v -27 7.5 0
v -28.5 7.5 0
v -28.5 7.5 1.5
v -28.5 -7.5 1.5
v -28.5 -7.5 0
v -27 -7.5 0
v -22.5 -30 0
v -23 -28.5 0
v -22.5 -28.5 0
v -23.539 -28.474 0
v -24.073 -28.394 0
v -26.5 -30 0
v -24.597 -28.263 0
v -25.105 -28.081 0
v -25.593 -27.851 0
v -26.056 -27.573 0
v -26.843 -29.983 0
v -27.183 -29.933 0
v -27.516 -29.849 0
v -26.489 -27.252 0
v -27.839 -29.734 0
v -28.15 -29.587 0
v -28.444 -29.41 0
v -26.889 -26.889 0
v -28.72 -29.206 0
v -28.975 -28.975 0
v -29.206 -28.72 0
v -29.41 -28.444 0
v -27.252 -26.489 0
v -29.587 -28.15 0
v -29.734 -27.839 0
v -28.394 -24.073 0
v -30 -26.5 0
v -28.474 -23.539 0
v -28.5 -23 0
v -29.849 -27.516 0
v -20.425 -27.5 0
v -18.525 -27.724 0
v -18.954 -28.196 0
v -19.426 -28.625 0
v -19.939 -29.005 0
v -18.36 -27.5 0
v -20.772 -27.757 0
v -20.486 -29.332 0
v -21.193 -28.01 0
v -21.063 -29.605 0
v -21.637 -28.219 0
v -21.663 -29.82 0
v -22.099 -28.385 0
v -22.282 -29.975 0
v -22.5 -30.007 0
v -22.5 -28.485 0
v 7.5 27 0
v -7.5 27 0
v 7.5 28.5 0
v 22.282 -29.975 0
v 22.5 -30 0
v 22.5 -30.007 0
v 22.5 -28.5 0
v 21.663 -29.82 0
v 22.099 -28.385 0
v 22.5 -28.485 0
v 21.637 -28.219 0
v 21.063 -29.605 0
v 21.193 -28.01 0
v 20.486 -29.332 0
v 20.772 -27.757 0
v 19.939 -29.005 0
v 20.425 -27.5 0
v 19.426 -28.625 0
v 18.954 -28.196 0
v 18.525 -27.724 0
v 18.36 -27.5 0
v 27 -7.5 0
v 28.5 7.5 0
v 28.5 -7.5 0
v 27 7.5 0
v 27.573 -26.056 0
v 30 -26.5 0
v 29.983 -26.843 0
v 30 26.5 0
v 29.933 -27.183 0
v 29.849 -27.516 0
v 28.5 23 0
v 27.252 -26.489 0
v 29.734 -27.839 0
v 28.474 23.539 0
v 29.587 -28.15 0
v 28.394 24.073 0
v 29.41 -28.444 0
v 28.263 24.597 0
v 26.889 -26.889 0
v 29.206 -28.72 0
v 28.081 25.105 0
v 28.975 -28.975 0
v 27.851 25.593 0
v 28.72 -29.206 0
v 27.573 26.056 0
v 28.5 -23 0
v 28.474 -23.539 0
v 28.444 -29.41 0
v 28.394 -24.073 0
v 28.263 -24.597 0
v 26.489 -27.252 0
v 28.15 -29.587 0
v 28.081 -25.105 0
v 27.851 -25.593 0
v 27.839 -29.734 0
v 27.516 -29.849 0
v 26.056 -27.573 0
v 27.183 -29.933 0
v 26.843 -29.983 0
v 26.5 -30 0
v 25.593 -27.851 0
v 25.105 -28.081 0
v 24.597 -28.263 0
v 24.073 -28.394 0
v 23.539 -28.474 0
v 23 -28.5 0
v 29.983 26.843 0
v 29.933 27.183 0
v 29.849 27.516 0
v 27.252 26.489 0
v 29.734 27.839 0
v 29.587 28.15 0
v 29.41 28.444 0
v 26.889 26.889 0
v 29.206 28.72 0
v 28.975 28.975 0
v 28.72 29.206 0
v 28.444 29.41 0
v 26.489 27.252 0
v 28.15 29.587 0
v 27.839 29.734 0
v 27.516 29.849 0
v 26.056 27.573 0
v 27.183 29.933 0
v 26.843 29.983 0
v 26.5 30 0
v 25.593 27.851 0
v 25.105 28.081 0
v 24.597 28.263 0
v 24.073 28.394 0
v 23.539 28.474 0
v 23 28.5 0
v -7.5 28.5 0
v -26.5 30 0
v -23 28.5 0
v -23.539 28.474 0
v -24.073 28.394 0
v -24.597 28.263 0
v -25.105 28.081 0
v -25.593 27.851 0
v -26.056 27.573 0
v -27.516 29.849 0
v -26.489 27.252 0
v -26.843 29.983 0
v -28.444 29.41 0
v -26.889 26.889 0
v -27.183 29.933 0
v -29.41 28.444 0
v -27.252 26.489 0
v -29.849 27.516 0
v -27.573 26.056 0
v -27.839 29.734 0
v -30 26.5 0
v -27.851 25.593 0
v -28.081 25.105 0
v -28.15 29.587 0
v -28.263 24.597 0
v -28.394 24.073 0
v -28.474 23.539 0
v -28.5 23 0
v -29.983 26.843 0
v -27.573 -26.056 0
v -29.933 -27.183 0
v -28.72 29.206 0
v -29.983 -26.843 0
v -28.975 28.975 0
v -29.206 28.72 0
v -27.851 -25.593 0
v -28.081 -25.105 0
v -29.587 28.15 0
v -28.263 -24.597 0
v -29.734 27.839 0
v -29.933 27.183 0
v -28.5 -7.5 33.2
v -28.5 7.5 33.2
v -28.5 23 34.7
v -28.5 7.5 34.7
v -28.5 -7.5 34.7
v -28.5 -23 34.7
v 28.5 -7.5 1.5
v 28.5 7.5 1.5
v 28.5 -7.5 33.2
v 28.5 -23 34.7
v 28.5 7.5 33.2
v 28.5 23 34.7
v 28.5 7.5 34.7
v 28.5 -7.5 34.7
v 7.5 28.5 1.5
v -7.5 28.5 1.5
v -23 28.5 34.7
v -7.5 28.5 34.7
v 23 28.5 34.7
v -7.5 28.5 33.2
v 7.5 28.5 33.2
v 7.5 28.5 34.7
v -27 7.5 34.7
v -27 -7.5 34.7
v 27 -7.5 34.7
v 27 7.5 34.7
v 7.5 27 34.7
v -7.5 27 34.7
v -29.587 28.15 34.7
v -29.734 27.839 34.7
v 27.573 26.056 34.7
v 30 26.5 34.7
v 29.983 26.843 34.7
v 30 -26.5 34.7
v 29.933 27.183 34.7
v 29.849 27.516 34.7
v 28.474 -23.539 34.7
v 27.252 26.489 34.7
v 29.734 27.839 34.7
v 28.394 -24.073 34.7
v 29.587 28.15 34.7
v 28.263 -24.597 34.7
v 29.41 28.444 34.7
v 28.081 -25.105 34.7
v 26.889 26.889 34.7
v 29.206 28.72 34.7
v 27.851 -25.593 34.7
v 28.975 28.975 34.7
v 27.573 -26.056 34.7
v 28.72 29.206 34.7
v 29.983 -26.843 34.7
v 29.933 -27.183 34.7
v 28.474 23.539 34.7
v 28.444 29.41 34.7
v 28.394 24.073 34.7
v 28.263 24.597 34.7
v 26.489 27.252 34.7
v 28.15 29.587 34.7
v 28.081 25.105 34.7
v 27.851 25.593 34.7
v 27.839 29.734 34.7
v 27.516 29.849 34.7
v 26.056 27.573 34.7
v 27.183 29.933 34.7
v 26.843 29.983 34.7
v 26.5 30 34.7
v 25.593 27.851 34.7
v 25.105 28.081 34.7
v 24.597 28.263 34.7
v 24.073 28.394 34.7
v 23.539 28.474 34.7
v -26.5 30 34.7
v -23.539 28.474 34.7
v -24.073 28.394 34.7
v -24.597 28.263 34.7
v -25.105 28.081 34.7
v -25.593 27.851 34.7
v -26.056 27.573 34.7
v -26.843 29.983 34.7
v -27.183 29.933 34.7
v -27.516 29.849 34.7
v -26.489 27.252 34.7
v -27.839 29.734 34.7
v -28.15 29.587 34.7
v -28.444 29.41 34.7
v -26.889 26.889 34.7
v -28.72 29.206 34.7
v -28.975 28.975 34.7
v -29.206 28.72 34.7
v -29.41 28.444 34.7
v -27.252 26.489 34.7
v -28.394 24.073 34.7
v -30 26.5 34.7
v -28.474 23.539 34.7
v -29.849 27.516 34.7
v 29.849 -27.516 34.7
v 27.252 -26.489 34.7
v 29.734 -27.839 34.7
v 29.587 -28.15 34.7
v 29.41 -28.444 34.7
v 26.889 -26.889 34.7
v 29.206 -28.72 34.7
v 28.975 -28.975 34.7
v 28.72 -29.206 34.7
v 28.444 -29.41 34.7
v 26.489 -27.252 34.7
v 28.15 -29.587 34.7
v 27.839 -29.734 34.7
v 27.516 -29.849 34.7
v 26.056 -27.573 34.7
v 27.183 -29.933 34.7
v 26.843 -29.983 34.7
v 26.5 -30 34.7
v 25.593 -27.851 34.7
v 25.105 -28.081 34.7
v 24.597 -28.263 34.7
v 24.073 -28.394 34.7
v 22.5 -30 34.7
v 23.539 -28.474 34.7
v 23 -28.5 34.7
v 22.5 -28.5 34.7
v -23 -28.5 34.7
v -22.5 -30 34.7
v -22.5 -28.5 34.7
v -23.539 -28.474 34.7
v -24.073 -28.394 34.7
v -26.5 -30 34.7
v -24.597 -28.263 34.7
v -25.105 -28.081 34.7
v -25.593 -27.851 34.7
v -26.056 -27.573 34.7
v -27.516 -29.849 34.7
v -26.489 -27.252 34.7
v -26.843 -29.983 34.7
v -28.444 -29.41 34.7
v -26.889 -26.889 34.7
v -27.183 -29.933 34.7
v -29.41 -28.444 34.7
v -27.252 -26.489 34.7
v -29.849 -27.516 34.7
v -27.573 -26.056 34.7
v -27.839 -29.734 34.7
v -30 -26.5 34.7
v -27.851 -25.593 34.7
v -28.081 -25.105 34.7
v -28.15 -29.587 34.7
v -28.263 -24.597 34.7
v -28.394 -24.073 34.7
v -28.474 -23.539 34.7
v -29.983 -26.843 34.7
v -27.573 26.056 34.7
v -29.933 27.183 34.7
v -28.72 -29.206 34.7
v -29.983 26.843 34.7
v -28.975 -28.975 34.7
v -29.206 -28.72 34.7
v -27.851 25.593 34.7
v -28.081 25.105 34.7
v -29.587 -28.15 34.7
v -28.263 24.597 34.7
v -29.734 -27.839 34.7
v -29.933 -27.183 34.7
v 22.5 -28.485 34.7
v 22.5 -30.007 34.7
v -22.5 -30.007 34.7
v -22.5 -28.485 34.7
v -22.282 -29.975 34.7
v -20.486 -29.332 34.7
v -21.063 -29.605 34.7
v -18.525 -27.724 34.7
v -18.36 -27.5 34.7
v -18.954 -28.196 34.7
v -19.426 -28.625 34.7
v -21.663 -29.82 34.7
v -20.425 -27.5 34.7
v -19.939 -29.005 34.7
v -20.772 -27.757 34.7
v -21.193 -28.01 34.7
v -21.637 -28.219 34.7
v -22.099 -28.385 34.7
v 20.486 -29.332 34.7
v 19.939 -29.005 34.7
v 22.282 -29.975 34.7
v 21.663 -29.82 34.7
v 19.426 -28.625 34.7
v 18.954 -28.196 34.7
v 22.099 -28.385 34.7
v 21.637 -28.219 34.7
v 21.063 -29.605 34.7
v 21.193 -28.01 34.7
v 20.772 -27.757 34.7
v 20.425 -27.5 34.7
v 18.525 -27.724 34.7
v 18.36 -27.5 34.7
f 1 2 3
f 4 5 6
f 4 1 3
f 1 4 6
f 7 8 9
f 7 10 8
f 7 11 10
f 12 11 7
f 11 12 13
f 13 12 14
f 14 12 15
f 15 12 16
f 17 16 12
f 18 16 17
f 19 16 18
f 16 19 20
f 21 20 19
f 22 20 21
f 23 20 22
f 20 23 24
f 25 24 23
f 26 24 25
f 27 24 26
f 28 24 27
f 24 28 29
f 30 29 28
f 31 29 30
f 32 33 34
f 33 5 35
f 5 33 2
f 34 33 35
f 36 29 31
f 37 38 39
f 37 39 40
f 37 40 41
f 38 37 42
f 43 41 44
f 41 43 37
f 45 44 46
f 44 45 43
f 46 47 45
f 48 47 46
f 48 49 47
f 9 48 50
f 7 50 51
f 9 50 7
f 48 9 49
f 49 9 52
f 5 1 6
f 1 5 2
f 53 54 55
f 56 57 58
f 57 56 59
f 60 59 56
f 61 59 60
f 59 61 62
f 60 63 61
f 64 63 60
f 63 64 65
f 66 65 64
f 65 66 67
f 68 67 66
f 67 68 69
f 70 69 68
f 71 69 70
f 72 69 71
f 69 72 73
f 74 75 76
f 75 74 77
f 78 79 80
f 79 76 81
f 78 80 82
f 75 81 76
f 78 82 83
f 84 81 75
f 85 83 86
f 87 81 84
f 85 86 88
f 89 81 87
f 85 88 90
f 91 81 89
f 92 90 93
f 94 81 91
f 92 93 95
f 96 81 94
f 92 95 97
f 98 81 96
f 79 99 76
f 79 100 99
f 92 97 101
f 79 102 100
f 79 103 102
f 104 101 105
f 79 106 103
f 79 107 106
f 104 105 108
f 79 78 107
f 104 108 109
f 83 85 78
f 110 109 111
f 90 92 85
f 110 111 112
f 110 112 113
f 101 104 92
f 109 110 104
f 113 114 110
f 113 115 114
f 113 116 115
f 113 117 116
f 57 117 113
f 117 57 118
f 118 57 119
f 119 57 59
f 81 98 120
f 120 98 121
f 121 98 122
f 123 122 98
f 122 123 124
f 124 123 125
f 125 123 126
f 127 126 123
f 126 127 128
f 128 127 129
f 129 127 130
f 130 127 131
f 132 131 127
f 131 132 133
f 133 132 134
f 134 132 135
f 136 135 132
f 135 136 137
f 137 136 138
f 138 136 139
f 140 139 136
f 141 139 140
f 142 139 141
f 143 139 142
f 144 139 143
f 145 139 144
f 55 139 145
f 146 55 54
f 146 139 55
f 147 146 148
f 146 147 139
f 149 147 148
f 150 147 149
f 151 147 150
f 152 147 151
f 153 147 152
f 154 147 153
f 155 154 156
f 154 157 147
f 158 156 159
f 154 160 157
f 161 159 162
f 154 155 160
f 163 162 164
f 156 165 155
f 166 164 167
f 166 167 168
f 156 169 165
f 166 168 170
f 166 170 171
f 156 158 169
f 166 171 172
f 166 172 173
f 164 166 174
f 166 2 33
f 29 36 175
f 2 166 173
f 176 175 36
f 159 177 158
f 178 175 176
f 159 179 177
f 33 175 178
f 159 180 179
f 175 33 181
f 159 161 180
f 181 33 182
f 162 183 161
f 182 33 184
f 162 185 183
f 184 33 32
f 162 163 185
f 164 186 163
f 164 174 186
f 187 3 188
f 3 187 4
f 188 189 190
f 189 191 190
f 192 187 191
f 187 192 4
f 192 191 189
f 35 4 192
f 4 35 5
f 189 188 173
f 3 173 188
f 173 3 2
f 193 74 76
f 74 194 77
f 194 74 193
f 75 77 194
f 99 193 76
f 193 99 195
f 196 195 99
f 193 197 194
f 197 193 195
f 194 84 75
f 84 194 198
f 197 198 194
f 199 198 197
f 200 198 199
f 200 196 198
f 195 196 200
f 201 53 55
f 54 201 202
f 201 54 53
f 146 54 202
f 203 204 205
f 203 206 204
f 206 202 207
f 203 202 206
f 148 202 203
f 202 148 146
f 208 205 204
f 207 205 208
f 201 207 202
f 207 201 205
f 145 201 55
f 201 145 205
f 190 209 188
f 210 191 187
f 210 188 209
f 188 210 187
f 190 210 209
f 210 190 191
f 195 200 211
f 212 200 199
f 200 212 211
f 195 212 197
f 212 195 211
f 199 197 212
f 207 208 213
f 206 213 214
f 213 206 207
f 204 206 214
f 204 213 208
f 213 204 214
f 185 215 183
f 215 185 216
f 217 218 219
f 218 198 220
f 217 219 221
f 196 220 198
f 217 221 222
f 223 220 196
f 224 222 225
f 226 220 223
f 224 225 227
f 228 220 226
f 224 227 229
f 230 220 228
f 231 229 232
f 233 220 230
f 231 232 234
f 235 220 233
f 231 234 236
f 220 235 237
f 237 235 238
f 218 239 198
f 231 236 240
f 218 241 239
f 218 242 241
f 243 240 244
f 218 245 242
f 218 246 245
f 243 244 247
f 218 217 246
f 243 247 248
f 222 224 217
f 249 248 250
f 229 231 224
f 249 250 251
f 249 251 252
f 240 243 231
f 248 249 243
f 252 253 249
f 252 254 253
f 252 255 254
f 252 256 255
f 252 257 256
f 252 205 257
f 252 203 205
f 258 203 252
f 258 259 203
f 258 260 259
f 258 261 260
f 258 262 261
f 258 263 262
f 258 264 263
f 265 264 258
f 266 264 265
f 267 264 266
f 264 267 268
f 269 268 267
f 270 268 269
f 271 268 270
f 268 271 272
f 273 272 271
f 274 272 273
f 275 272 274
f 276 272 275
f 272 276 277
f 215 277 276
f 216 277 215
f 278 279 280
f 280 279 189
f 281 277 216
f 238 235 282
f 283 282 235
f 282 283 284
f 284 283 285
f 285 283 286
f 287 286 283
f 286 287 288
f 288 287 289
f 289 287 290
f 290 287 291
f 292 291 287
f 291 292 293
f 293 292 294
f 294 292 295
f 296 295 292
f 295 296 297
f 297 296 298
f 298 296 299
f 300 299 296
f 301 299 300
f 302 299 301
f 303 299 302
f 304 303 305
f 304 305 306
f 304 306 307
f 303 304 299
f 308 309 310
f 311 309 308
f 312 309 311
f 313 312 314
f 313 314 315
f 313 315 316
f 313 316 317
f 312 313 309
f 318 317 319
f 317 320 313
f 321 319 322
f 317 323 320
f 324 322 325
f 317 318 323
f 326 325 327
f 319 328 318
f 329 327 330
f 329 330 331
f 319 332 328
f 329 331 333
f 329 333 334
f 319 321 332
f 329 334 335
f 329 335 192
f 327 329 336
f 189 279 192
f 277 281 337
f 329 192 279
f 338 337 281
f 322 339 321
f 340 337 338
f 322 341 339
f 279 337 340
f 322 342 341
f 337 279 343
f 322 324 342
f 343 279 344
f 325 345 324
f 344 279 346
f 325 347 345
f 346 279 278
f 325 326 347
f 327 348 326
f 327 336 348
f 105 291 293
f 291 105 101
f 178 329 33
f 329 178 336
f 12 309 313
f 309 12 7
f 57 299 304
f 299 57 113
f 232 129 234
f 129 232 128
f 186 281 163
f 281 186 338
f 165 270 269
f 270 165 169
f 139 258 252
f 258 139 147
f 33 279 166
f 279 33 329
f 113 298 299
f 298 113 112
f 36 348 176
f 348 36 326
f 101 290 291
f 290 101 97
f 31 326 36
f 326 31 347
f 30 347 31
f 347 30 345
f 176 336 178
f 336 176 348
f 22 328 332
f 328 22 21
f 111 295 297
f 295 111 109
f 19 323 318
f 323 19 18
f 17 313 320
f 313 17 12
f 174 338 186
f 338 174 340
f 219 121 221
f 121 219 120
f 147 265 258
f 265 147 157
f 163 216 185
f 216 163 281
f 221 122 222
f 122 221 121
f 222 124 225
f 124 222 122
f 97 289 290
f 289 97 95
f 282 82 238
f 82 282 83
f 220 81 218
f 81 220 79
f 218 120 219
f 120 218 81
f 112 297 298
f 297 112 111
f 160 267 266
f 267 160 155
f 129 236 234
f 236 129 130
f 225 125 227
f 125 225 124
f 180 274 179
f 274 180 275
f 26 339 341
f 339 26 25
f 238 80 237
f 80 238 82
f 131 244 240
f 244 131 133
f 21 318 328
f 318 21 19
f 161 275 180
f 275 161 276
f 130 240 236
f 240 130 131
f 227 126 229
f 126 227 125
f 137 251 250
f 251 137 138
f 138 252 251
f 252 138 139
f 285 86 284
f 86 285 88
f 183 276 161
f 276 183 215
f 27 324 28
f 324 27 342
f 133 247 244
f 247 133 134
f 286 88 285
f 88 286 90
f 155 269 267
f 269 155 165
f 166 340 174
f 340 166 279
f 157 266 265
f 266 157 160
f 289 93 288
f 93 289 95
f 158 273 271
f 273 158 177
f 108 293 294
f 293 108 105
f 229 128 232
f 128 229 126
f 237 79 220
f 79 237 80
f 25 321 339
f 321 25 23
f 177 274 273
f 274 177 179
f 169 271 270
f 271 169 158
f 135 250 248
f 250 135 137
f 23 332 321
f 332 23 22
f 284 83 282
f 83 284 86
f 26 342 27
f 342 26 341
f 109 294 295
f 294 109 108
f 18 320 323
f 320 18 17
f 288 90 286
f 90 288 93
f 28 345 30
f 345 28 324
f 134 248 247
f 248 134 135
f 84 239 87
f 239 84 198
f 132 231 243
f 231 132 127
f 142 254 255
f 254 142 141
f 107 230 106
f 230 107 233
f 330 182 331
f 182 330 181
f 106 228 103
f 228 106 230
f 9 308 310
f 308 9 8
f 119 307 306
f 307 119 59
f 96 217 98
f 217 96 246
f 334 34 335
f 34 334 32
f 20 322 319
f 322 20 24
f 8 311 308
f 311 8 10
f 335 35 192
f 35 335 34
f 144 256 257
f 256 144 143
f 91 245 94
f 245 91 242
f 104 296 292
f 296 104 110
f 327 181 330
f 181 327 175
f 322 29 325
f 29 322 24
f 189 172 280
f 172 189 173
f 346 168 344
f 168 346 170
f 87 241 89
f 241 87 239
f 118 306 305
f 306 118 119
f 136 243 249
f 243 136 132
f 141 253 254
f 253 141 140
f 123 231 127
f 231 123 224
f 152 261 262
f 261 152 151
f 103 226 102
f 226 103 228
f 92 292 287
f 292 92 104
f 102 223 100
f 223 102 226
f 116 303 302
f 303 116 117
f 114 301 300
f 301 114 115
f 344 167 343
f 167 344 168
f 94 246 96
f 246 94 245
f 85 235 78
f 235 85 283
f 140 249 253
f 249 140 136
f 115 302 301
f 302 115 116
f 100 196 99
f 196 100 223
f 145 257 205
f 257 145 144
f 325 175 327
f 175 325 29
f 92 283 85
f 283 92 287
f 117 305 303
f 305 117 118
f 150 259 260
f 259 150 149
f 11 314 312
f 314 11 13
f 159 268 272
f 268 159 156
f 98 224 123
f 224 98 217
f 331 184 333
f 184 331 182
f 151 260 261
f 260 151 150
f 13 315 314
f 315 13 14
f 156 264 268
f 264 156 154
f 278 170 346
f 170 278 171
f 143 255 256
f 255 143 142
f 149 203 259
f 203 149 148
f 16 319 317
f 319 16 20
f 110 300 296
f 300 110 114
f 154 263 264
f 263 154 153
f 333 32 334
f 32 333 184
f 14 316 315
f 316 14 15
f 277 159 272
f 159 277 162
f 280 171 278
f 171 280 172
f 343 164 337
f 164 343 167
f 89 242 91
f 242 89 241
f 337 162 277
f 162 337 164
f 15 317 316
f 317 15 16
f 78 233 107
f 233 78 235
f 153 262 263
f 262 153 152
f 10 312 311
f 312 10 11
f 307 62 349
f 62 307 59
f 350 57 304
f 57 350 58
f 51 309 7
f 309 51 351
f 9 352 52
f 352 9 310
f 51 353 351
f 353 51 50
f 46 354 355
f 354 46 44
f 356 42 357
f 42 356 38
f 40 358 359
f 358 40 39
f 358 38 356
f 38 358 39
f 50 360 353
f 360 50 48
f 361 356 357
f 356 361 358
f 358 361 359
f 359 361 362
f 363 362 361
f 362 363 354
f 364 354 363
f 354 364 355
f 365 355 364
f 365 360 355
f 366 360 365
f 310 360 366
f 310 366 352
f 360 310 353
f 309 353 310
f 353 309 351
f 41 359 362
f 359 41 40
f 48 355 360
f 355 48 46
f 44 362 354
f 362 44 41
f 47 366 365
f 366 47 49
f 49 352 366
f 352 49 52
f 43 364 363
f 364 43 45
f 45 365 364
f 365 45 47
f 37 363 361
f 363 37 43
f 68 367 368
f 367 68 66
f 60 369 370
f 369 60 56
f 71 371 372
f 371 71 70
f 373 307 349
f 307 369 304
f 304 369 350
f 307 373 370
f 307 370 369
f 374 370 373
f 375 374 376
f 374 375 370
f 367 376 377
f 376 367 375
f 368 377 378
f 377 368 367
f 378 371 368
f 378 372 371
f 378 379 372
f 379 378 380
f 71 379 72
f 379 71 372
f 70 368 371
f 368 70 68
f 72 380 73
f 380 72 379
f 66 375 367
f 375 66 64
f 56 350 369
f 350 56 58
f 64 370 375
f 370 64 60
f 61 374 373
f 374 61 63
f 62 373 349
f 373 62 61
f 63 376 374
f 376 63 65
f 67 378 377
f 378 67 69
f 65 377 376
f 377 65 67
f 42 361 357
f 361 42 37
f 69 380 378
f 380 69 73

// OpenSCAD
W=57;
H=35-0.3;

for(j=[0,1])
    translate([0,0,j*(H)])
mirror([0,0,j])
for(i=[0,2,3])
    rotate([0,0,i*90])
translate([-W/2,0,0])
rotate([90,0,0])
linear_extrude(height=15,center=true)
polygon([[0,0],[1.5,0],[0,1.5]]);

difference() {
cube_center([W+3,W+3,H],r=5.5-2);
    
    cube_center([W,W,H],r=5.5);
    
    translate([0,-20,0])
        cube_center([W-12,W+10,H+2]);
    
}


intersection() {
    for(i=[-1,1])
translate([i*47.1/2,-47.2/2])
    difference() {
        cylinder(d=13,h=H,$fn=64);
cylinder(d=10,h=100,$fn=64);
    }
    
    translate([0,-61,0])
    cube_center([W-12,W+10,H+2]);
}



module cube_center(dims,r=0,$fn=64) {
    if(r==0) {
        translate([-dims[0]/2, -dims[1]/2, 0])
        cube(dims);
    } else {
        minkowski() {
            translate([-(dims[0]-2*r)/2, -(dims[1]-2*r)/2, 0])
            cube([dims[0]-2*r,dims[1]-2*r,dims[2]]);
            cylinder(r=r,$fn=$fn,h=0.0001);
        }
    }
}
